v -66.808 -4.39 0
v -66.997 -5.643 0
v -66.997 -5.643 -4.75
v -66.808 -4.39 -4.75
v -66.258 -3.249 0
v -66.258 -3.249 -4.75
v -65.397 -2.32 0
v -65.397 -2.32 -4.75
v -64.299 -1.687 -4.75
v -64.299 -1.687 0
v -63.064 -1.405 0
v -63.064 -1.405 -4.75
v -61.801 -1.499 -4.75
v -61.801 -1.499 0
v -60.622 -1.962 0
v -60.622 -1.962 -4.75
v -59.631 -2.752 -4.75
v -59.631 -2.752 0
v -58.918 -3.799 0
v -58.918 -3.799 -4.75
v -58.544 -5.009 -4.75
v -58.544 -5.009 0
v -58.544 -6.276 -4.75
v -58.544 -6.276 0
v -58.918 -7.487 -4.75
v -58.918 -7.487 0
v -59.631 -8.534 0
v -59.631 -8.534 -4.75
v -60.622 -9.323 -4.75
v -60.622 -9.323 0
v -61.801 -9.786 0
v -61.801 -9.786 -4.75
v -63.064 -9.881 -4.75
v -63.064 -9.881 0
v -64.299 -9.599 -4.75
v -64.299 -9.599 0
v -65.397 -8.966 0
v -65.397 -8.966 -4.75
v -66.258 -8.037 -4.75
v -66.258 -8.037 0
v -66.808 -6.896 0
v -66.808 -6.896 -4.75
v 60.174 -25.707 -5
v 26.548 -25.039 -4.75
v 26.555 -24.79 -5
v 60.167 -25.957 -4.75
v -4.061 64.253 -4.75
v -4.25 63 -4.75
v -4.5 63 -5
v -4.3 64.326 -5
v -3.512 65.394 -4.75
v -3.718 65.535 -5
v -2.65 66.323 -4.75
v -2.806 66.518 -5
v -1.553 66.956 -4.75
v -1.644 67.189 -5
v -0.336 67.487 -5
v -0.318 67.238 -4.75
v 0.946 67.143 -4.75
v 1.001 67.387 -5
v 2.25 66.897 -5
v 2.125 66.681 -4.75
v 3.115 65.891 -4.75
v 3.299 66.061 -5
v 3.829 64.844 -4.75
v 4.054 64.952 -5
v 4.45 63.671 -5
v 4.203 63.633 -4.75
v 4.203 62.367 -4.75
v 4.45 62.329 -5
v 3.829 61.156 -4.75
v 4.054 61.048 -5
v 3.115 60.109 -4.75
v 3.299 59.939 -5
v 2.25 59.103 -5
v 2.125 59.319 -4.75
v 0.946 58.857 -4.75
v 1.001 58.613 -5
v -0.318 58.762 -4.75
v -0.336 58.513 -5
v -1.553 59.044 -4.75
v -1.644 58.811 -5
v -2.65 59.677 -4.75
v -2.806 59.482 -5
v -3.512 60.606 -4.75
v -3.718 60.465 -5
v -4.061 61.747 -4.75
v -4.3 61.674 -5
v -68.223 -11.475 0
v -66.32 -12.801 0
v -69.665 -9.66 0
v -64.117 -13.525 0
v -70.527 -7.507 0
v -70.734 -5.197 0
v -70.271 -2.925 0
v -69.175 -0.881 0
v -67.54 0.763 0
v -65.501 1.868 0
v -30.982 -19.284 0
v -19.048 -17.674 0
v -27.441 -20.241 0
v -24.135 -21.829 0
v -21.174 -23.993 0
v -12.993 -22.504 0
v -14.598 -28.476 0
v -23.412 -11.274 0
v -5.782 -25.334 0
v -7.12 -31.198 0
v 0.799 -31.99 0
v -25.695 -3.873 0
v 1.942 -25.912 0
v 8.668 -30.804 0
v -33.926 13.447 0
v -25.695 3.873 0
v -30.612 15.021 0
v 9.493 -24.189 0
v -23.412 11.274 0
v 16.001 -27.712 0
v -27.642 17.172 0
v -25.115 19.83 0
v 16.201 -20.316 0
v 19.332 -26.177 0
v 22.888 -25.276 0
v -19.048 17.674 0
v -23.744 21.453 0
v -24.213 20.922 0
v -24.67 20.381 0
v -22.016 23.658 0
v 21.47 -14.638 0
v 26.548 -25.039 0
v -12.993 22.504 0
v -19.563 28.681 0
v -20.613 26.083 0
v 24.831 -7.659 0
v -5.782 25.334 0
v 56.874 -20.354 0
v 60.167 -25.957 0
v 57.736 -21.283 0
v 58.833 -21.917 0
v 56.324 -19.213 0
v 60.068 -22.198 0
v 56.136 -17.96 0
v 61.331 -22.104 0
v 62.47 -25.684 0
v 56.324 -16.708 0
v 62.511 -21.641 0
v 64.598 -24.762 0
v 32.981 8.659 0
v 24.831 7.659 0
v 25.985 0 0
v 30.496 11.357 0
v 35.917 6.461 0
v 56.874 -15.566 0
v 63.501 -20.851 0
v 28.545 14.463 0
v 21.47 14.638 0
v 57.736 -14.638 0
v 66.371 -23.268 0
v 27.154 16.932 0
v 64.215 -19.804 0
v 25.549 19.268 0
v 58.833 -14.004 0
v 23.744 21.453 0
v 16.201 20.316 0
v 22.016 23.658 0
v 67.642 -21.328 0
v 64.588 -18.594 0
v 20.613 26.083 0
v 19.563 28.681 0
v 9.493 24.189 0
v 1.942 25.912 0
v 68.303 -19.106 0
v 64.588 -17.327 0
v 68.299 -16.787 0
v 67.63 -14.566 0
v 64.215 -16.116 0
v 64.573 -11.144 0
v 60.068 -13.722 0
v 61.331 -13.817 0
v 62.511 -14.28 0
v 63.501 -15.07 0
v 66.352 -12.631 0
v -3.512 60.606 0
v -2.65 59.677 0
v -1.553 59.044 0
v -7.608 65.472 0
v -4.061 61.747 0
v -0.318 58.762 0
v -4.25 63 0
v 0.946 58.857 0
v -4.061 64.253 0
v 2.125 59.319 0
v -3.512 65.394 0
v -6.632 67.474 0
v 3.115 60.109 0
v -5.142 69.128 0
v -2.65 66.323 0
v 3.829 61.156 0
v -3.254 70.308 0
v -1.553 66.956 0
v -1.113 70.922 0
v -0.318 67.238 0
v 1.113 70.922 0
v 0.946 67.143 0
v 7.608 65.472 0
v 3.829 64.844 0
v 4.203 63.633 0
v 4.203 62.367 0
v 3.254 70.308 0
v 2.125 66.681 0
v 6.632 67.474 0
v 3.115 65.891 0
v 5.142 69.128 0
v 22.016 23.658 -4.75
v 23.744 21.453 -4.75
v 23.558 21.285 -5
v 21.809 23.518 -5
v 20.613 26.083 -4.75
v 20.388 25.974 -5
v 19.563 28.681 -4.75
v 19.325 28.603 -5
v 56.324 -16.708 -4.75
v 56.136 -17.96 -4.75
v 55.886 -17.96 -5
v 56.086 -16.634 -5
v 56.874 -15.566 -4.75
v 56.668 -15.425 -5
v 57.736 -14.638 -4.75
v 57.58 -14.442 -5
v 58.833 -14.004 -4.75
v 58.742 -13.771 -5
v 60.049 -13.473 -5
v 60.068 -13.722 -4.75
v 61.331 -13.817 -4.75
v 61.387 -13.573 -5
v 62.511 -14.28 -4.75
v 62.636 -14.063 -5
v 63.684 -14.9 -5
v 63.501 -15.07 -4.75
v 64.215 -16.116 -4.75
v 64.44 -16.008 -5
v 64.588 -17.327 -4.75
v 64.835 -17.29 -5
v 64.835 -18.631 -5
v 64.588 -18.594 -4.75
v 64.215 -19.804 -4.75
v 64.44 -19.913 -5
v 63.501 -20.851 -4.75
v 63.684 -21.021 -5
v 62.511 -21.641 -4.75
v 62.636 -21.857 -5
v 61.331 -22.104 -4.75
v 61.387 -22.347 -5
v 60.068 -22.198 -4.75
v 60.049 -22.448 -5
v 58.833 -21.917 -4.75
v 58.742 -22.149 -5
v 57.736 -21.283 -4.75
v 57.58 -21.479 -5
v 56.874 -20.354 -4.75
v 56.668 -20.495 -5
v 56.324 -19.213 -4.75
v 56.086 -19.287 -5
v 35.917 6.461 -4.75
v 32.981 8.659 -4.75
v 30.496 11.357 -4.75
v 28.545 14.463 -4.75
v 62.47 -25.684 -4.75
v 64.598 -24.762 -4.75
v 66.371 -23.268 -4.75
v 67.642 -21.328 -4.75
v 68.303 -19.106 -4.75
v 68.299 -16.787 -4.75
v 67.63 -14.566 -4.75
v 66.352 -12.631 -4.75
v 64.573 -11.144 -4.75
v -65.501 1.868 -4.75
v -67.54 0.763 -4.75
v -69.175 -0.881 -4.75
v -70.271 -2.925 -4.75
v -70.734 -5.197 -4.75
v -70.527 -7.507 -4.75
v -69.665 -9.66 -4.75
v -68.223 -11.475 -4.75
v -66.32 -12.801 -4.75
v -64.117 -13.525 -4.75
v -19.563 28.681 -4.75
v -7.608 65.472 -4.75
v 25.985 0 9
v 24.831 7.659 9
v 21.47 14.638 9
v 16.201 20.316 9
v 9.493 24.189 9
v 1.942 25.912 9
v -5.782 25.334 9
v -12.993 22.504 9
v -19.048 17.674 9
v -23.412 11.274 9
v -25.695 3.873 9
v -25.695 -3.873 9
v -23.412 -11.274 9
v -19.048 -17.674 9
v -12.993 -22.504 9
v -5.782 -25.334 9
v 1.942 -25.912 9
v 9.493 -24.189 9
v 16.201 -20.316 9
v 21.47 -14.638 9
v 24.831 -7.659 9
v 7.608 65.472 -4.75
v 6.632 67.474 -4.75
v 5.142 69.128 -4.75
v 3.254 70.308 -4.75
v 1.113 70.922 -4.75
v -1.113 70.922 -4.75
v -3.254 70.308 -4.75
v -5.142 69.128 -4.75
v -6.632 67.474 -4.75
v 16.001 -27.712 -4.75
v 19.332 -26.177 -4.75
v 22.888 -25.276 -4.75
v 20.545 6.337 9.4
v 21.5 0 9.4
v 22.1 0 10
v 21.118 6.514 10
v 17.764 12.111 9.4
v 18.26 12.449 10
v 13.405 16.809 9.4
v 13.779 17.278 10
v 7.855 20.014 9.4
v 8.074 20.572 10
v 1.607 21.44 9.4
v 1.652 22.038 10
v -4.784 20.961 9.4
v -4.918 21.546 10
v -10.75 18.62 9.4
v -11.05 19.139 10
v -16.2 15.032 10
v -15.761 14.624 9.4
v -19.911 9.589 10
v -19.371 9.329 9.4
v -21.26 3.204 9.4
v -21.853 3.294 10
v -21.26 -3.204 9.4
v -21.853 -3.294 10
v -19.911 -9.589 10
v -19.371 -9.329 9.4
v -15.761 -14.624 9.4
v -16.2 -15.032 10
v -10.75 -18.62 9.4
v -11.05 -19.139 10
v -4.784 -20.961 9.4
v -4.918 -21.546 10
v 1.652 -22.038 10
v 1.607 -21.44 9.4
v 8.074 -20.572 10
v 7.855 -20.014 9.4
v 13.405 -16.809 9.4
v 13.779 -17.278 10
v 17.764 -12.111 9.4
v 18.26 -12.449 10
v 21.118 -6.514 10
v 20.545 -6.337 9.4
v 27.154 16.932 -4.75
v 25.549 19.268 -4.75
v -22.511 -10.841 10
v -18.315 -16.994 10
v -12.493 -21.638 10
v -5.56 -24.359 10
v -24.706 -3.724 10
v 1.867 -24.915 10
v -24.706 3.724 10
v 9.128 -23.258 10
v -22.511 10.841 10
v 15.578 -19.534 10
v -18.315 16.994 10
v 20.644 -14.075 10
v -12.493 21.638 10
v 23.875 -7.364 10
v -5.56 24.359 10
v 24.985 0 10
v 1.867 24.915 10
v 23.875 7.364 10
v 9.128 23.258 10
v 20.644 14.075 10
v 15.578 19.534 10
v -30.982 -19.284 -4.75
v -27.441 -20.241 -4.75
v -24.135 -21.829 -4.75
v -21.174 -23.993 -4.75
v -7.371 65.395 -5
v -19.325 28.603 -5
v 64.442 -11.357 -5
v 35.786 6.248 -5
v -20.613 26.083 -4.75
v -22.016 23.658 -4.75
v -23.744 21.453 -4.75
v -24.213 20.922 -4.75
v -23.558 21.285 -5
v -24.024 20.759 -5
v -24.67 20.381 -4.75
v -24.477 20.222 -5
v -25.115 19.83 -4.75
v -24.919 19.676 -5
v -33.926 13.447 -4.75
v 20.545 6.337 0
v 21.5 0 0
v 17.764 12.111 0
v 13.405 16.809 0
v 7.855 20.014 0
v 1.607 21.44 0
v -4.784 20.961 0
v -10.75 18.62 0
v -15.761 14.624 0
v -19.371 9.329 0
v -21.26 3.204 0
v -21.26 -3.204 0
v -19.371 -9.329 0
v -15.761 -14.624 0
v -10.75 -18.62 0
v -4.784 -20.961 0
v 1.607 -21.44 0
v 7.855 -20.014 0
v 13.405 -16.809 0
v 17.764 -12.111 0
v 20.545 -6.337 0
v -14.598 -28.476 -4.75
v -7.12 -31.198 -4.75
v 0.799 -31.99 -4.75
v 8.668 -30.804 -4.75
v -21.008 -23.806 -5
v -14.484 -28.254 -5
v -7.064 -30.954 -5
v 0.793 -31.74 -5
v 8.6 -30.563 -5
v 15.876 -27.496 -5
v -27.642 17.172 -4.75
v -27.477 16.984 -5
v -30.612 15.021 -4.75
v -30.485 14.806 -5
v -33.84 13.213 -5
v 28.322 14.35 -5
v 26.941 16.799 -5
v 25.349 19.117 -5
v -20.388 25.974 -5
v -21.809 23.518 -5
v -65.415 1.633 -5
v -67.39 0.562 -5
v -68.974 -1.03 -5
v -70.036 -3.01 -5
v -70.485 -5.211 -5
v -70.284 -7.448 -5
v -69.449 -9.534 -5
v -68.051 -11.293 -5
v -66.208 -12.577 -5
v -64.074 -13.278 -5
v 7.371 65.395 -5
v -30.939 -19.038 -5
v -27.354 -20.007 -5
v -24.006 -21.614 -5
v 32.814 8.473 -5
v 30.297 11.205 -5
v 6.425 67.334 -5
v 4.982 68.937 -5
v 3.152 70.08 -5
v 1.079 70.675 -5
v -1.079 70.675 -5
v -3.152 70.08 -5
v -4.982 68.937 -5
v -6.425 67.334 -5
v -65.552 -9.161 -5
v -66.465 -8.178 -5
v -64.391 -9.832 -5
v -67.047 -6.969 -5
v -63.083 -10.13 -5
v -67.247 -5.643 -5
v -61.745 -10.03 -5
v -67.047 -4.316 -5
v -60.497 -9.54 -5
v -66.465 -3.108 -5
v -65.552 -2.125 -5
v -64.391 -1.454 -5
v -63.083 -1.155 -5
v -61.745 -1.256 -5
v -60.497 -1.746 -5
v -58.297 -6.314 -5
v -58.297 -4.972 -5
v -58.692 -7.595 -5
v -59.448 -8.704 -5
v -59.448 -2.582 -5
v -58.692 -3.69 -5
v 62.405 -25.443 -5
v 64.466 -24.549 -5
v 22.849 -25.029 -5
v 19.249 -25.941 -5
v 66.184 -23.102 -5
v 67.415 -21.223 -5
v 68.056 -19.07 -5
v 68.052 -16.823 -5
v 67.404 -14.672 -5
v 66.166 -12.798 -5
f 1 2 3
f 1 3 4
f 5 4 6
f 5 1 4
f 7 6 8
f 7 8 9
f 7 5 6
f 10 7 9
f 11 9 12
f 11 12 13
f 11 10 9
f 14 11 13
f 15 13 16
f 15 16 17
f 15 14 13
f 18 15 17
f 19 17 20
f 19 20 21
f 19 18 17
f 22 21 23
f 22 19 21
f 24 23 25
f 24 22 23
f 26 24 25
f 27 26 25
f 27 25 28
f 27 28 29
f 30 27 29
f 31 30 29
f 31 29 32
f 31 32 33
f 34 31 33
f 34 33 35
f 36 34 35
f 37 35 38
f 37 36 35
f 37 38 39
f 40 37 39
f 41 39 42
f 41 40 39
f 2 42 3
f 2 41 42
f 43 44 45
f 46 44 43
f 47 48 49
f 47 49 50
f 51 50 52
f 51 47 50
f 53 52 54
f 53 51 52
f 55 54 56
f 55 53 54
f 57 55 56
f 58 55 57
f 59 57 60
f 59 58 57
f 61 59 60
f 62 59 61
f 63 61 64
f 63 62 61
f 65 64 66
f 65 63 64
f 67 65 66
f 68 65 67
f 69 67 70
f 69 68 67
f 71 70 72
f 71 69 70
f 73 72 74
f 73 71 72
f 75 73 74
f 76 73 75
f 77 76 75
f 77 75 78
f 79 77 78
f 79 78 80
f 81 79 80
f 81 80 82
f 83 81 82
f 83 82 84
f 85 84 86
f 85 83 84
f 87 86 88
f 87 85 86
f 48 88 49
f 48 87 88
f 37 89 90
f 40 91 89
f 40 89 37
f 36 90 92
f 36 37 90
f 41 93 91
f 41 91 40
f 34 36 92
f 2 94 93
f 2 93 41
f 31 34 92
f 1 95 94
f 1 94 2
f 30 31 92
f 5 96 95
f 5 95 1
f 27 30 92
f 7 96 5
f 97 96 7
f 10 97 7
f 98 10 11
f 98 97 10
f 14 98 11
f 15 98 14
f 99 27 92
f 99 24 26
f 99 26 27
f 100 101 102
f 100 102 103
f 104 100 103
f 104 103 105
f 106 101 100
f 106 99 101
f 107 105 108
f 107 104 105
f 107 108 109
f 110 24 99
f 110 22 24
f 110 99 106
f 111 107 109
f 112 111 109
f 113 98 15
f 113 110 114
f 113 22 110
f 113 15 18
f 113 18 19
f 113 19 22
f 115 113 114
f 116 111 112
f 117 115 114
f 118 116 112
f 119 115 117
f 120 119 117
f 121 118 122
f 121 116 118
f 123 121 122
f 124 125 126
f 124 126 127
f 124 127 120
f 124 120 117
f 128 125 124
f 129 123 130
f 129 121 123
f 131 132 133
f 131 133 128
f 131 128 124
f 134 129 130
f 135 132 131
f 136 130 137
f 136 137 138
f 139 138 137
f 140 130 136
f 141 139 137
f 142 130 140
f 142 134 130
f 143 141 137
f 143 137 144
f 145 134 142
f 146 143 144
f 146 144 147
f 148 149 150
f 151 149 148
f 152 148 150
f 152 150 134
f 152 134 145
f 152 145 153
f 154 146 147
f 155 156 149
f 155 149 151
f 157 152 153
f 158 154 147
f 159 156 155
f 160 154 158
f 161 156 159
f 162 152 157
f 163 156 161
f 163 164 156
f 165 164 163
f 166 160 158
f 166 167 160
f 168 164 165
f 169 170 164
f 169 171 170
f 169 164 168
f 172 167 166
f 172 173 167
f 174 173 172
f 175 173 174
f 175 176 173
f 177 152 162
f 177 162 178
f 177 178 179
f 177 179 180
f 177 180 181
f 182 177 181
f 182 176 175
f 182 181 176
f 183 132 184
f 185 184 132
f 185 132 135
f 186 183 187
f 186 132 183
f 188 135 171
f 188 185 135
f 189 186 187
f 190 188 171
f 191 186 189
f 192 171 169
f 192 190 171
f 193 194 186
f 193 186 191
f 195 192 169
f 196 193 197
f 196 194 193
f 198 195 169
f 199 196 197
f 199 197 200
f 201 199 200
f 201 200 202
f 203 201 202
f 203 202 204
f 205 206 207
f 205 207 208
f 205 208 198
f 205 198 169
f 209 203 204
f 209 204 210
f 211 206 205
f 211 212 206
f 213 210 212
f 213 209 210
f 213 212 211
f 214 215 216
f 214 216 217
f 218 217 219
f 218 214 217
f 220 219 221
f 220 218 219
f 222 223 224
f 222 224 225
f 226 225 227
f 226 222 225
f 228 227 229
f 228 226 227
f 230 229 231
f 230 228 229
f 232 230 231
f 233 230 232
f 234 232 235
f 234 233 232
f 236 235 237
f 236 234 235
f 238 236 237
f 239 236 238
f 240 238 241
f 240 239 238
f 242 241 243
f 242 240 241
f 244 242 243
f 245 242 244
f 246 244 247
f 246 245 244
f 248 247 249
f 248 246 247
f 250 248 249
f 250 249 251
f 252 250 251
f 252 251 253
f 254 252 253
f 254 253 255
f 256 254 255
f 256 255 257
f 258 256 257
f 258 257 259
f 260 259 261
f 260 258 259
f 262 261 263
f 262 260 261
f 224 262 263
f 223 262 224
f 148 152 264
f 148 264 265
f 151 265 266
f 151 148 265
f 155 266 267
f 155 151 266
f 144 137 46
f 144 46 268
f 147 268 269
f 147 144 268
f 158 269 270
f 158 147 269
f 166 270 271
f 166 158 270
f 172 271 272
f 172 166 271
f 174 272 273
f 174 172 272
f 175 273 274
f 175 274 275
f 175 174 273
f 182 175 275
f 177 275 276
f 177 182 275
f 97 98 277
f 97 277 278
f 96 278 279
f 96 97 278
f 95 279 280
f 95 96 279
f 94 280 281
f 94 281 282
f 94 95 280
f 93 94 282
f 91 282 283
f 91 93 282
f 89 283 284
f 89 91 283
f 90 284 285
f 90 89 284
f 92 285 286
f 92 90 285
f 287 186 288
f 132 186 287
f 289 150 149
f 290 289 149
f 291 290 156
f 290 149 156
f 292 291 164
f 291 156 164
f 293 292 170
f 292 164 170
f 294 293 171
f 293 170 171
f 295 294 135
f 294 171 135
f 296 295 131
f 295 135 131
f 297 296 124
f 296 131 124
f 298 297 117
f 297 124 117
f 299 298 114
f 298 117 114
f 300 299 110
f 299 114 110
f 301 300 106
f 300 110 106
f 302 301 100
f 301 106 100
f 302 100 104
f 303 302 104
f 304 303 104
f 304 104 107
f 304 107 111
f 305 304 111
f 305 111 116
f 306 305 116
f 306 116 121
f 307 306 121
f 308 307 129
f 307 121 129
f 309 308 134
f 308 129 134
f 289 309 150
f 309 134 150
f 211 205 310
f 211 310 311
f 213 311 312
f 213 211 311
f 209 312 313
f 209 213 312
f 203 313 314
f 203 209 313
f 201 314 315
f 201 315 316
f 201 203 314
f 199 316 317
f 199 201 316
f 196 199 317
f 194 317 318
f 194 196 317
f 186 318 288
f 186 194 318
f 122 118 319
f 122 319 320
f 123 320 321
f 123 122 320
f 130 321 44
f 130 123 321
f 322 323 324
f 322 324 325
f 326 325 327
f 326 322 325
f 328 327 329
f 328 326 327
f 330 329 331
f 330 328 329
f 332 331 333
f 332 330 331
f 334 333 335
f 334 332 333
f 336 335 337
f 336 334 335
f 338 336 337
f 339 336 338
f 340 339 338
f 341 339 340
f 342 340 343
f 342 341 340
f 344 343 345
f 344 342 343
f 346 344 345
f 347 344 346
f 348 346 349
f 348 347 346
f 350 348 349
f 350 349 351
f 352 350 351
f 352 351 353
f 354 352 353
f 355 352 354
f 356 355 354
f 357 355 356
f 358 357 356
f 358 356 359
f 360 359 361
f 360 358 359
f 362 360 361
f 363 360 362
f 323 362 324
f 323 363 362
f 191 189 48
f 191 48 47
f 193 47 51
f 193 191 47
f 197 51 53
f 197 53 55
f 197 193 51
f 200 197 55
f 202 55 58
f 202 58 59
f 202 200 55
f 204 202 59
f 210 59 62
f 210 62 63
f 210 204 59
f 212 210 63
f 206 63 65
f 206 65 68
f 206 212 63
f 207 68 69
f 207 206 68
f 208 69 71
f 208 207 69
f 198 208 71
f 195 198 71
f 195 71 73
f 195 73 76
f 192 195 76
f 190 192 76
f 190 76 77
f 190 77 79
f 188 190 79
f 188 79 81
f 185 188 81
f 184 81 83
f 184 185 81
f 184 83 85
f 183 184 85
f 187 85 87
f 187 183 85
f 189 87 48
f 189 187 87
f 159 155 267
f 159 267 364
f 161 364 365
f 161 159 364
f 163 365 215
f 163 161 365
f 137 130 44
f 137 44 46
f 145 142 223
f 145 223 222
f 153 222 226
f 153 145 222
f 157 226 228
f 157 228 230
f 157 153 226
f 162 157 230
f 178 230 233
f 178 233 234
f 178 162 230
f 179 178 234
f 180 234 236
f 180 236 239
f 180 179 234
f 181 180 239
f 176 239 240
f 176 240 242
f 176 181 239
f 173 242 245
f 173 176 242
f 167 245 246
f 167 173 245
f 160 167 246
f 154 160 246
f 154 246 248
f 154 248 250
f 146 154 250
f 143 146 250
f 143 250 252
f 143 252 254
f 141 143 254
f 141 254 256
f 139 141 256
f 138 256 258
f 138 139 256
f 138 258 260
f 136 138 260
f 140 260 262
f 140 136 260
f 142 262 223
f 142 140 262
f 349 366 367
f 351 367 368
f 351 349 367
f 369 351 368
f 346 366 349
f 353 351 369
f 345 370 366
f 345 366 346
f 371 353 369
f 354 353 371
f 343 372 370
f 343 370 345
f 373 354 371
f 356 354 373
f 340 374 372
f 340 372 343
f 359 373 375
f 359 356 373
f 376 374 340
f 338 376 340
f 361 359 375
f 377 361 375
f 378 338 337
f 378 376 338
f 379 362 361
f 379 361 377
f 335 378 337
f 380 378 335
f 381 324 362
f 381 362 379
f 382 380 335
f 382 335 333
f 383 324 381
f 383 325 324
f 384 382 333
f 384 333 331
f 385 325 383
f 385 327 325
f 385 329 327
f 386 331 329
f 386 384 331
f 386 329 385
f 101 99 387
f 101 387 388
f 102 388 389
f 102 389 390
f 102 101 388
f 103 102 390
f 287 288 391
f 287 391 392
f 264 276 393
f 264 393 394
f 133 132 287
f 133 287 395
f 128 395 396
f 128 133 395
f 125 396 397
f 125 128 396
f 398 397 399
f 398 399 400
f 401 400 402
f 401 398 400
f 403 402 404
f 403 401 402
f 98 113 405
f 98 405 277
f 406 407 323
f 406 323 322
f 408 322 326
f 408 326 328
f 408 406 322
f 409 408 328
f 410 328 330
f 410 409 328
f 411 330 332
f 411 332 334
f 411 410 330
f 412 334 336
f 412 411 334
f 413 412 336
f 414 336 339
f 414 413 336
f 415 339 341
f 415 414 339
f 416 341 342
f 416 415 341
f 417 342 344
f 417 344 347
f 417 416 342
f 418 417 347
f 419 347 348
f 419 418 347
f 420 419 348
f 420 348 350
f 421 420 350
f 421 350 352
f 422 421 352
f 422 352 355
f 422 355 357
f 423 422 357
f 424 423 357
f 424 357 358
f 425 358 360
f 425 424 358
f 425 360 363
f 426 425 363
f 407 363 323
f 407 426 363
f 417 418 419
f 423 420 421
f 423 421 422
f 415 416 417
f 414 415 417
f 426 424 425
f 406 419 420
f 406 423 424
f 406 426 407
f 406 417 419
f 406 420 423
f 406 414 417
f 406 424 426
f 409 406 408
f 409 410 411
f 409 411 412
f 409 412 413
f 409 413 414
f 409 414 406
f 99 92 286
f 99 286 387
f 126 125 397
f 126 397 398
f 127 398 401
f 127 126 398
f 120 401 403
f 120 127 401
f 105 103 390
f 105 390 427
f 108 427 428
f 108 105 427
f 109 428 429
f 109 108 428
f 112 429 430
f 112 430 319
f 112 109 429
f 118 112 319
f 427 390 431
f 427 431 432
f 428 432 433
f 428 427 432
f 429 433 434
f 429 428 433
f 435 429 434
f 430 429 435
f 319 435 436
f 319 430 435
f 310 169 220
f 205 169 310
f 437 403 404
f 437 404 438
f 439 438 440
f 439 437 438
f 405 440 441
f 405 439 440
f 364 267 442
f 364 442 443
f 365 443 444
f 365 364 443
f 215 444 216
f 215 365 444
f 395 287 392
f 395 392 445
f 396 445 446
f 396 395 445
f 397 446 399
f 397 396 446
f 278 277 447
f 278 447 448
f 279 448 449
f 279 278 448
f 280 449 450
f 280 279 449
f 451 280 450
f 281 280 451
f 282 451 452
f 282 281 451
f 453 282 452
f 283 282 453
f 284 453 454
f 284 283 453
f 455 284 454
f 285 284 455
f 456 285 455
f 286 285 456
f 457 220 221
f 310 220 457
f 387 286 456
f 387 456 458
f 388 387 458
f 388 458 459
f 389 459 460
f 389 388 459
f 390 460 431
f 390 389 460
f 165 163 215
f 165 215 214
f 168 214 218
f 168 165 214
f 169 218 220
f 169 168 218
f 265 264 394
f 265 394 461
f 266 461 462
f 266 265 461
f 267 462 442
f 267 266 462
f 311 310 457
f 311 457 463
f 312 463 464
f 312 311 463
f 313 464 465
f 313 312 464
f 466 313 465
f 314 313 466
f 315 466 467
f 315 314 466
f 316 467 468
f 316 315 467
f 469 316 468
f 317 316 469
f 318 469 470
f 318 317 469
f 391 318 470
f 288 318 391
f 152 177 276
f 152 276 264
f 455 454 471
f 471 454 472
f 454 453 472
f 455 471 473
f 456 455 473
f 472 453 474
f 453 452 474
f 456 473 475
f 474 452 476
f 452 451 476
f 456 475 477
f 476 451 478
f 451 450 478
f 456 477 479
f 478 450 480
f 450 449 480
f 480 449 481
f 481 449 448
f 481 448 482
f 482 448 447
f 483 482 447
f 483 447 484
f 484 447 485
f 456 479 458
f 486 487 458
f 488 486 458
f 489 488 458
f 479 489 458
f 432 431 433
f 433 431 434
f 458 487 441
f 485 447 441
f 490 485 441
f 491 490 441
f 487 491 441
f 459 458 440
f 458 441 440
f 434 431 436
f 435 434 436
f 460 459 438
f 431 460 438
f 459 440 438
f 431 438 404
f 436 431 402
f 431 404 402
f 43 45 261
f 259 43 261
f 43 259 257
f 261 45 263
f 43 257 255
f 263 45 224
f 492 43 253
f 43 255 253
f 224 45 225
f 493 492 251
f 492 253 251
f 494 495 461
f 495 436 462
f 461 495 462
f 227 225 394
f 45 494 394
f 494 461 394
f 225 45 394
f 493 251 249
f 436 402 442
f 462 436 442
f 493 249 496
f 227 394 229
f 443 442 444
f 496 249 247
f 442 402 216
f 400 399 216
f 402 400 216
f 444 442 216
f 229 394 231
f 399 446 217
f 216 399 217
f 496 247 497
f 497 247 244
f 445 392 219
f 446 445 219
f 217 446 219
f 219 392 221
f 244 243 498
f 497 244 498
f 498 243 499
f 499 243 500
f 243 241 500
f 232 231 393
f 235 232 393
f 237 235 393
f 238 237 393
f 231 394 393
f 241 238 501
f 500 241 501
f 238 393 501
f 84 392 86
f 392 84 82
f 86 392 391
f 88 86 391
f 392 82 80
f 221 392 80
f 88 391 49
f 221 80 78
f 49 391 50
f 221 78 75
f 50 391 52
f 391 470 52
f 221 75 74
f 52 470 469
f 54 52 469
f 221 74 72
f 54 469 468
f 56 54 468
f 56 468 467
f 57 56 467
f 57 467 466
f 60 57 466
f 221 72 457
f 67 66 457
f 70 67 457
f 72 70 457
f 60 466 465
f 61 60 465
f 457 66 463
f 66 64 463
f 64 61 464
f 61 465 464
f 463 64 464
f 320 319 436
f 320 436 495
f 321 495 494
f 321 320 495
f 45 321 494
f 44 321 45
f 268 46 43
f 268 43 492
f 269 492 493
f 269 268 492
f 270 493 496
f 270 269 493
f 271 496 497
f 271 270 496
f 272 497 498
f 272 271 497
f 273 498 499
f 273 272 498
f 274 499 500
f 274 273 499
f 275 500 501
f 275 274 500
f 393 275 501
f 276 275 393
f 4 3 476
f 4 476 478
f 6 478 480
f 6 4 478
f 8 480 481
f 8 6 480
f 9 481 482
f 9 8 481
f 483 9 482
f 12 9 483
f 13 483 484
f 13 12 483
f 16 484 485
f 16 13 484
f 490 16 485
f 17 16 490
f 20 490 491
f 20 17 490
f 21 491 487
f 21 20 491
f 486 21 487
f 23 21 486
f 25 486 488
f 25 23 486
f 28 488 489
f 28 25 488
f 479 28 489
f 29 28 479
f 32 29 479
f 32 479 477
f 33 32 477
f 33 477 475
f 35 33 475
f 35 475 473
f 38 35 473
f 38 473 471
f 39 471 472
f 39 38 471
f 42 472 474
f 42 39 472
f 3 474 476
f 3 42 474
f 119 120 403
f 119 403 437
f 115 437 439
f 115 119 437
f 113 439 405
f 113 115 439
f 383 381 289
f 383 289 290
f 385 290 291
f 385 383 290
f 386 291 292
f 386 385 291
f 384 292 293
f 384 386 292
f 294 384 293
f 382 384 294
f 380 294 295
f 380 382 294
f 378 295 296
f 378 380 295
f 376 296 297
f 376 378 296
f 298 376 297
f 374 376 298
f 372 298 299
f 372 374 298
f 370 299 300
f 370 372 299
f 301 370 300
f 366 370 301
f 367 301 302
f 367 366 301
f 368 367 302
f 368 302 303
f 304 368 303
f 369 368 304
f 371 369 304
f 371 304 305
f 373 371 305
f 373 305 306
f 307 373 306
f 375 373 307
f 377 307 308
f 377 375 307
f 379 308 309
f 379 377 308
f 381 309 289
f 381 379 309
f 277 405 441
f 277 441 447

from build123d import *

# Parameters (mm, degrees)
ESQUISSE1_R        = 25.985
ESQUISSE1_R_2      = 21.5
BOSS_EXTRU_1_DEPTH = 10
CHANFREIN1_SIZE    = 1
CHANFREIN2_SIZE    = 0.6
ESQUISSE2_R        = 4.25
BOSS_EXTRU_2_DEPTH = 5
CHANFREIN3_SIZE    = 0.25


with BuildPart() as part:
    # Esquisse1 → Boss.-Extru.1 (new body)
    with BuildSketch(Plane.XY):
        Circle(ESQUISSE1_R)
        Circle(ESQUISSE1_R_2, mode=Mode.SUBTRACT)
    extrude(amount=BOSS_EXTRU_1_DEPTH)

    # Chanfrein1
    chanfrein1_edges = [part.edges().sort_by_distance(p)[0] for p in [
        (-25.985, 0, 10),
    ]]
    chamfer(chanfrein1_edges, length=CHANFREIN1_SIZE)

    # Chanfrein2
    chanfrein2_edges = [part.edges().sort_by_distance(p)[0] for p in [
        (-21.5, 0, 10),
    ]]
    chamfer(chanfrein2_edges, length=CHANFREIN2_SIZE)

    # Esquisse2 → Boss.-Extru.2 (add)
    with BuildSketch(Plane(origin=(0, 0, 0), x_dir=(-1, 0, 0), z_dir=(0, 0, -1))):
        with BuildLine():
            Line((7.60845213, 65.472135955), (19.562751949, 28.680584205))
            ThreePointArc((19.562751949, 28.680584205), (21.2719439, 24.846095602), (23.743927554, 21.452876365))
            ThreePointArc((23.743927554, 21.452876365), (24.442816498, 20.653055987), (25.114776372, 19.830481783))
            ThreePointArc((25.114776372, 19.830481783), (29.077787425, 16.028245766), (33.925593306, 13.447309217))
            Line((33.925593306, 13.447309217), (65.50114543, 1.86803233))
            ThreePointArc((65.50114543, 1.86803233), (70.71462295, -6.359410431), (64.116870777, -13.524661891))
            Line((64.116870777, -13.524661891), (30.982002055, -19.284490011))
            ThreePointArc((30.982002055, -19.284490011), (25.751494228, -20.959077483), (21.173682289, -23.993231927))
            ThreePointArc((21.173682289, -23.993231927), (3.185198765, -31.841082093), (-16.001386984, -27.712012099))
            ThreePointArc((-16.001386984, -27.712012099), (-21.089512057, -25.644782414), (-26.548088017, -25.039469423))
            Line((-26.548088017, -25.039469423), (-60.167318575, -25.957337556))
            ThreePointArc((-60.167318575, -25.957337556), (-68.053671575, -20.240992693), (-64.573244793, -11.143861737))
            Line((-64.573244793, -11.143861737), (-35.917071141, 6.460650663))
            ThreePointArc((-35.917071141, 6.460650663), (-31.676574653, 9.950728723), (-28.545263087, 14.462639983))
            ThreePointArc((-28.545263087, 14.462639983), (-26.377181723, 18.117513195), (-23.743927554, 21.452876365))
            ThreePointArc((-23.743927554, 21.452876365), (-21.2719439, 24.846095602), (-19.562751949, 28.680584205))
            Line((-19.562751949, 28.680584205), (-7.60845213, 65.472135955))
            ThreePointArc((-7.60845213, 65.472135955), (0, 71), (7.60845213, 65.472135955))
        make_face()
        with Locations((0, 63)):
            Circle(ESQUISSE2_R, mode=Mode.SUBTRACT)
        with Locations((62.746778111, -5.642857143)):
            Circle(ESQUISSE2_R, mode=Mode.SUBTRACT)
        with Locations((-60.385652242, -17.96031746)):
            Circle(ESQUISSE2_R, mode=Mode.SUBTRACT)
    extrude(amount=BOSS_EXTRU_2_DEPTH)

    # Chanfrein3
    chanfrein3_edges = [part.edges().sort_by_distance(p)[0] for p in [
        (-25.751494228, -20.959077483, -5),
        (-47.549436416, -16.404575951, -5),
        (-70.71462295, -6.359410431, -5),
        (-49.713369368, 7.657670773, -5),
        (-29.077787425, 16.028245766, -5),
        (-24.442816498, 20.653055987, -5),
        (-21.2719439, 24.846095602, -5),
        (-13.58560204, 47.07636008, -5),
        (0, 71, -5),
        (13.58560204, 47.07636008, -5),
        (21.2719439, 24.846095602, -5),
        (26.377181723, 18.117513195, -5),
        (31.676574653, 9.950728723, -5),
        (50.245157967, -2.341605537, -5),
        (68.053671575, -20.240992693, -5),
        (43.357703296, -25.498403489, -5),
        (21.089512057, -25.644782414, -5),
        (-3.185198765, -31.841082093, -5),
        (4.25, 63, -5),
        (-58.496778111, -5.642857143, -5),
        (64.635652242, -17.96031746, -5),
    ]]
    chamfer(chanfrein3_edges, length=CHANFREIN3_SIZE)


solid = part.part
